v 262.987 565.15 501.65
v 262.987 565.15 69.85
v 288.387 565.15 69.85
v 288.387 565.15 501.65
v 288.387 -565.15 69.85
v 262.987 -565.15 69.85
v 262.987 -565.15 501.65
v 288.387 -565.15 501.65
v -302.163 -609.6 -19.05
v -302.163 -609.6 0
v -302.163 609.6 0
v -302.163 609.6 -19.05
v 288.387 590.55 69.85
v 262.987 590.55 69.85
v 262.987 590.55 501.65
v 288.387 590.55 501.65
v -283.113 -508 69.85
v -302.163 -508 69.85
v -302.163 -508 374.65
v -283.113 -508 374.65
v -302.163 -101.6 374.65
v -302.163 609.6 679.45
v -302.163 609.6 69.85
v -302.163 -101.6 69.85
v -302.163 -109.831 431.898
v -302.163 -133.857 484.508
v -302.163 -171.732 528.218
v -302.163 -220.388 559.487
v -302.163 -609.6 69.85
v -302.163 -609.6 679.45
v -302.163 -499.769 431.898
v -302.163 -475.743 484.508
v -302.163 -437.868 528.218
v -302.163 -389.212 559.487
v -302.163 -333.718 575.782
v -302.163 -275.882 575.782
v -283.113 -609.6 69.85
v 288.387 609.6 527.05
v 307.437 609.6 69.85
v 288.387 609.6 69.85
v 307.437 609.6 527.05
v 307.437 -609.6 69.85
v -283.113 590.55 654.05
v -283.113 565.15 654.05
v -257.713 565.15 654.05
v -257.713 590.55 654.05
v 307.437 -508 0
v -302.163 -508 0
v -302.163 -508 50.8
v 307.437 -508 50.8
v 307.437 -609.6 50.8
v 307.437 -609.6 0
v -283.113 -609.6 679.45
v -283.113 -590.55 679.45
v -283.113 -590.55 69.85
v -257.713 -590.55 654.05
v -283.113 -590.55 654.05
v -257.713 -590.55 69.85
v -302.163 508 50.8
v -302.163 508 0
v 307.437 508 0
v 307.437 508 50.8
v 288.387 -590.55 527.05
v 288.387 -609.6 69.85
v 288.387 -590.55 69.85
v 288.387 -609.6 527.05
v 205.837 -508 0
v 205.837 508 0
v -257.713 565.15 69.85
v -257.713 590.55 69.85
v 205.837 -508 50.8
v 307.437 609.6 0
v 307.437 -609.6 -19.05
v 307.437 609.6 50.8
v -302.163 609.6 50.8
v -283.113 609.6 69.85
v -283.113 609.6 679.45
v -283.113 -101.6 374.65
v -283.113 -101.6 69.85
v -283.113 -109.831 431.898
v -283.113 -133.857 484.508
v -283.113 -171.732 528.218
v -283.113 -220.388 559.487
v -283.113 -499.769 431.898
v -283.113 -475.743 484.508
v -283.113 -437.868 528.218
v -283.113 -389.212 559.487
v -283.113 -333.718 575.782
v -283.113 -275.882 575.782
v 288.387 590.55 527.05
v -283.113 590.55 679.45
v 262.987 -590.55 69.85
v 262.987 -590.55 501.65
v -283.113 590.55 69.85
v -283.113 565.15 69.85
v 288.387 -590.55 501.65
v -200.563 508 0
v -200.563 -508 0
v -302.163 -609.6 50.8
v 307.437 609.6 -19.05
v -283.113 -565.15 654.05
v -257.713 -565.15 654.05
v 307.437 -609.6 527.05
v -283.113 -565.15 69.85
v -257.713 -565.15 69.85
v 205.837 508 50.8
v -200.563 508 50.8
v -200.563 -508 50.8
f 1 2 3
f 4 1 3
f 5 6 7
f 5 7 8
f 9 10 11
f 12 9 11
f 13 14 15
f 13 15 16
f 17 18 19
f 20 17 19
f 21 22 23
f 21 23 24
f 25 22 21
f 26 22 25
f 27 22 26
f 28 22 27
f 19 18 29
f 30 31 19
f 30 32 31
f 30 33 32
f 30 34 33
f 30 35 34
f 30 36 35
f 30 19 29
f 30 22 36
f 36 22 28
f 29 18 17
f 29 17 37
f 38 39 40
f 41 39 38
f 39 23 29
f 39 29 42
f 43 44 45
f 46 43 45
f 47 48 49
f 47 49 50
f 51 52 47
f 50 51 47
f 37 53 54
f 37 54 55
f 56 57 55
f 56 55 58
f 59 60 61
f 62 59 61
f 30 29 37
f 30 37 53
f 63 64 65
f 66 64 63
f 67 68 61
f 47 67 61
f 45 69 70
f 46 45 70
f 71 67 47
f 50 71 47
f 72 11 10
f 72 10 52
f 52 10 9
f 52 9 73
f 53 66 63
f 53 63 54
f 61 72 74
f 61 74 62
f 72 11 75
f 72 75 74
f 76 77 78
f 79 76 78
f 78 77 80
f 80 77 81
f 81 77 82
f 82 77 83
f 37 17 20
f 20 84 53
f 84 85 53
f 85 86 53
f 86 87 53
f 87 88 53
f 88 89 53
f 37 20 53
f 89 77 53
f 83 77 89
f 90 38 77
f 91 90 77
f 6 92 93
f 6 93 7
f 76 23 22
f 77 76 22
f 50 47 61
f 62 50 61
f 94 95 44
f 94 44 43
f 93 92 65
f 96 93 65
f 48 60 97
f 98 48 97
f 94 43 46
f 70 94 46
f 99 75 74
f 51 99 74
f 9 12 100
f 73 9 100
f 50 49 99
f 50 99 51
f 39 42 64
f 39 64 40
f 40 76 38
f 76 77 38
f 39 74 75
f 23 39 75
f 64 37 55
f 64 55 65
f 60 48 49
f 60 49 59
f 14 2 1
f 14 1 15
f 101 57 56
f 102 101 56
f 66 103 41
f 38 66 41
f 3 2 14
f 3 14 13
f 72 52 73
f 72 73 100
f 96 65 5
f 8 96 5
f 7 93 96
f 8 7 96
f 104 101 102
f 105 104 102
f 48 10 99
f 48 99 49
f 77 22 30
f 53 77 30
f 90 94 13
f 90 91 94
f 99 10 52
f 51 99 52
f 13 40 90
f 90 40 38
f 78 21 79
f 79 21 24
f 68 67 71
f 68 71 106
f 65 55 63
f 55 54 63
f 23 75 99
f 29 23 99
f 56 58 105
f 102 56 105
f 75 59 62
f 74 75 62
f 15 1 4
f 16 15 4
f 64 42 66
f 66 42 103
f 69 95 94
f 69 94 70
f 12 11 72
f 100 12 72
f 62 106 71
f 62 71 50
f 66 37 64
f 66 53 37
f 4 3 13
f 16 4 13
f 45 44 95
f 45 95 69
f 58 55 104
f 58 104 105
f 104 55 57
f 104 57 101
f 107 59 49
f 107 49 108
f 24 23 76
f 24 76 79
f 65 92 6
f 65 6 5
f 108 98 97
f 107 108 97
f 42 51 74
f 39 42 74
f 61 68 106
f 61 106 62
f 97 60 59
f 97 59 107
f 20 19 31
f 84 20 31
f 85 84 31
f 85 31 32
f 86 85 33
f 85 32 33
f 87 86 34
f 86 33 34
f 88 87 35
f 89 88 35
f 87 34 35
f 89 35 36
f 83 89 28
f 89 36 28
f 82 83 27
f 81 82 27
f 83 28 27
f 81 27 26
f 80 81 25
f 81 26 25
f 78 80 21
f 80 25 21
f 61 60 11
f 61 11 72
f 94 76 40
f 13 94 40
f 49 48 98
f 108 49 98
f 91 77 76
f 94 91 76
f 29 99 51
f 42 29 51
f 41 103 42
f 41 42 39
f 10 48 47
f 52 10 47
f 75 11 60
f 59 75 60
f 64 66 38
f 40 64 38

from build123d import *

# Parameters (mm, degrees)
F0_W      = 609.6
F0_H      = 1219.2
F1_DEPTH  = 19.05
F2_W      = 609.6
F2_H      = 101.6
F3_DEPTH  = 50.8
F5_W      = 101.6
F5_H      = 1016
F6_DEPTH  = 50.8
F7_W      = 101.6
F7_H      = 1016
F8_DEPTH  = 50.8
F10_DEPTH = 19.05
F11_W     = 1219.2
F11_H     = 609.6
F12_DEPTH = 19.05
F13_W     = 571.5
F13_H     = 457.2
F14_DEPTH = 19.05
F16_W     = 1219.2
F16_H     = 457.2
F17_DEPTH = 19.05
F18_W     = 25.4
F18_H     = 25.4
F19_DEPTH = 584.2
F20_W     = 25.4
F20_H     = 25.4
F21_DEPTH = 431.8
F23_DEPTH = 19.05


with BuildPart() as f1:
    # F0 (on Top) → F1 (new body)
    with BuildSketch(Plane.XY):
        with Locations((2.6372357175, 0)):
            Rectangle(F0_W, F0_H)
    extrude(amount=-F1_DEPTH)


with BuildPart() as f3:
    # F2 (on face) → F3 (new body)
    with BuildSketch(Plane.XY):
        with Locations((2.6372357175, -558.8)):
            Rectangle(F2_W, F2_H)
    extrude(amount=F3_DEPTH)


with BuildPart() as f4_1:
    # F4: instance of F3
    add(f3.part.mirror(Plane.XZ))


with BuildPart() as f6:
    # F5 (on face) → F6 (new body)
    with BuildSketch(Plane.XY):
        with Locations((256.6372357175, 0)):
            Rectangle(F5_W, F5_H)
    extrude(amount=F6_DEPTH)


with BuildPart() as f8:
    # F7 (on face) → F8 (new body)
    with BuildSketch(Plane.XY):
        with Locations((-251.3627642825, 0)):
            Rectangle(F7_W, F7_H)
    extrude(amount=F8_DEPTH)


with BuildPart() as f10:
    # F9 (on face) → F10 (new body)
    with BuildSketch(Plane.XY.offset(50.8)):
        Polygon((-302.1627642825, 609.6), (-302.1627642825, 508), (-302.1627642825, -609.6), (307.4372357175, -609.6), (307.4372357175, 609.6), align=None)
    extrude(amount=F10_DEPTH)


with BuildPart() as f12:
    # F11 (on face) → F12 (new body)
    with BuildSketch(Plane(origin=(-302.1627642825, 0, 0), x_dir=(0, -1, 0), z_dir=(-1, 0, 0))):
        with Locations((0, 374.65)):
            Rectangle(F11_W, F11_H)
    extrude(amount=-F12_DEPTH)

    # F22 (on face) → F23 (cut, through all)
    with BuildSketch(Plane(origin=(-302.1627642825, 0, 0), x_dir=(0, -1, 0), z_dir=(-1, 0, 0))):
        with BuildLine():
            Line((101.6, 69.85), (508, 69.85))
            Line((508, 69.85), (508, 374.65))
            ThreePointArc((508, 374.65), (304.8, 171.45), (101.6, 374.65))
            Line((101.6, 374.65), (101.6, 69.85))
        make_face()
        with BuildLine():
            ThreePointArc((101.6, 374.65), (304.8, 171.45), (508, 374.65))
            Line((508, 374.65), (101.6, 374.65))
        make_face()
        with BuildLine():
            Line((101.6, 374.65), (508, 374.65))
            ThreePointArc((508, 374.65), (304.8, 577.85), (101.6, 374.65))
        make_face()
    extrude(amount=-F23_DEPTH, mode=Mode.SUBTRACT)


with BuildPart() as f14:
    # F13 (on face) → F14 (new body)
    with BuildSketch(Plane.XZ.offset(609.6)):
        with Locations((2.6372357175, 298.45)):
            Rectangle(F13_W, F13_H)
        Polygon((-283.1127642825, 679.45), (-283.1127642825, 527.05), (288.3872357175, 527.05), align=None)
    extrude(amount=-F14_DEPTH)


with BuildPart() as f15_1:
    # F15: instance of F14
    add(f14.part.mirror(Plane.XZ))


with BuildPart() as f17:
    # F16 (on face) → F17 (new body)
    with BuildSketch(Plane.YZ.offset(307.4372357175)):
        with Locations((0, 298.45)):
            Rectangle(F16_W, F16_H)
    extrude(amount=-F17_DEPTH)


with BuildPart() as f19:
    # F18 (on face) → F19 (new body)
    with BuildSketch(Plane.XY.offset(69.85)):
        with Locations((-270.4127642825, 577.85)):
            Rectangle(F18_W, F18_H)
    extrude(amount=F19_DEPTH)


with BuildPart() as f19b:
    # F18 (on face) → F19, piece 2 (new body)
    with BuildSketch(Plane.XY.offset(69.85)):
        with Locations((-270.4127642825, -577.85)):
            Rectangle(F18_W, F18_H)
    extrude(amount=F19_DEPTH)


with BuildPart() as f21:
    # F20 (on face) → F21 (new body)
    with BuildSketch(Plane.XY.offset(69.85)):
        with Locations((275.6872357175, 577.85)):
            Rectangle(F20_W, F20_H)
    extrude(amount=F21_DEPTH)


with BuildPart() as f21b:
    # F20 (on face) → F21, piece 2 (new body)
    with BuildSketch(Plane.XY.offset(69.85)):
        with Locations((275.6872357175, -577.85)):
            Rectangle(F20_W, F20_H)
    extrude(amount=F21_DEPTH)


solid = Compound([f1.part, f3.part, f4_1.part, f6.part, f8.part, f10.part, f12.part, f14.part, f15_1.part, f17.part, f19.part, f19b.part, f21.part, f21b.part])
